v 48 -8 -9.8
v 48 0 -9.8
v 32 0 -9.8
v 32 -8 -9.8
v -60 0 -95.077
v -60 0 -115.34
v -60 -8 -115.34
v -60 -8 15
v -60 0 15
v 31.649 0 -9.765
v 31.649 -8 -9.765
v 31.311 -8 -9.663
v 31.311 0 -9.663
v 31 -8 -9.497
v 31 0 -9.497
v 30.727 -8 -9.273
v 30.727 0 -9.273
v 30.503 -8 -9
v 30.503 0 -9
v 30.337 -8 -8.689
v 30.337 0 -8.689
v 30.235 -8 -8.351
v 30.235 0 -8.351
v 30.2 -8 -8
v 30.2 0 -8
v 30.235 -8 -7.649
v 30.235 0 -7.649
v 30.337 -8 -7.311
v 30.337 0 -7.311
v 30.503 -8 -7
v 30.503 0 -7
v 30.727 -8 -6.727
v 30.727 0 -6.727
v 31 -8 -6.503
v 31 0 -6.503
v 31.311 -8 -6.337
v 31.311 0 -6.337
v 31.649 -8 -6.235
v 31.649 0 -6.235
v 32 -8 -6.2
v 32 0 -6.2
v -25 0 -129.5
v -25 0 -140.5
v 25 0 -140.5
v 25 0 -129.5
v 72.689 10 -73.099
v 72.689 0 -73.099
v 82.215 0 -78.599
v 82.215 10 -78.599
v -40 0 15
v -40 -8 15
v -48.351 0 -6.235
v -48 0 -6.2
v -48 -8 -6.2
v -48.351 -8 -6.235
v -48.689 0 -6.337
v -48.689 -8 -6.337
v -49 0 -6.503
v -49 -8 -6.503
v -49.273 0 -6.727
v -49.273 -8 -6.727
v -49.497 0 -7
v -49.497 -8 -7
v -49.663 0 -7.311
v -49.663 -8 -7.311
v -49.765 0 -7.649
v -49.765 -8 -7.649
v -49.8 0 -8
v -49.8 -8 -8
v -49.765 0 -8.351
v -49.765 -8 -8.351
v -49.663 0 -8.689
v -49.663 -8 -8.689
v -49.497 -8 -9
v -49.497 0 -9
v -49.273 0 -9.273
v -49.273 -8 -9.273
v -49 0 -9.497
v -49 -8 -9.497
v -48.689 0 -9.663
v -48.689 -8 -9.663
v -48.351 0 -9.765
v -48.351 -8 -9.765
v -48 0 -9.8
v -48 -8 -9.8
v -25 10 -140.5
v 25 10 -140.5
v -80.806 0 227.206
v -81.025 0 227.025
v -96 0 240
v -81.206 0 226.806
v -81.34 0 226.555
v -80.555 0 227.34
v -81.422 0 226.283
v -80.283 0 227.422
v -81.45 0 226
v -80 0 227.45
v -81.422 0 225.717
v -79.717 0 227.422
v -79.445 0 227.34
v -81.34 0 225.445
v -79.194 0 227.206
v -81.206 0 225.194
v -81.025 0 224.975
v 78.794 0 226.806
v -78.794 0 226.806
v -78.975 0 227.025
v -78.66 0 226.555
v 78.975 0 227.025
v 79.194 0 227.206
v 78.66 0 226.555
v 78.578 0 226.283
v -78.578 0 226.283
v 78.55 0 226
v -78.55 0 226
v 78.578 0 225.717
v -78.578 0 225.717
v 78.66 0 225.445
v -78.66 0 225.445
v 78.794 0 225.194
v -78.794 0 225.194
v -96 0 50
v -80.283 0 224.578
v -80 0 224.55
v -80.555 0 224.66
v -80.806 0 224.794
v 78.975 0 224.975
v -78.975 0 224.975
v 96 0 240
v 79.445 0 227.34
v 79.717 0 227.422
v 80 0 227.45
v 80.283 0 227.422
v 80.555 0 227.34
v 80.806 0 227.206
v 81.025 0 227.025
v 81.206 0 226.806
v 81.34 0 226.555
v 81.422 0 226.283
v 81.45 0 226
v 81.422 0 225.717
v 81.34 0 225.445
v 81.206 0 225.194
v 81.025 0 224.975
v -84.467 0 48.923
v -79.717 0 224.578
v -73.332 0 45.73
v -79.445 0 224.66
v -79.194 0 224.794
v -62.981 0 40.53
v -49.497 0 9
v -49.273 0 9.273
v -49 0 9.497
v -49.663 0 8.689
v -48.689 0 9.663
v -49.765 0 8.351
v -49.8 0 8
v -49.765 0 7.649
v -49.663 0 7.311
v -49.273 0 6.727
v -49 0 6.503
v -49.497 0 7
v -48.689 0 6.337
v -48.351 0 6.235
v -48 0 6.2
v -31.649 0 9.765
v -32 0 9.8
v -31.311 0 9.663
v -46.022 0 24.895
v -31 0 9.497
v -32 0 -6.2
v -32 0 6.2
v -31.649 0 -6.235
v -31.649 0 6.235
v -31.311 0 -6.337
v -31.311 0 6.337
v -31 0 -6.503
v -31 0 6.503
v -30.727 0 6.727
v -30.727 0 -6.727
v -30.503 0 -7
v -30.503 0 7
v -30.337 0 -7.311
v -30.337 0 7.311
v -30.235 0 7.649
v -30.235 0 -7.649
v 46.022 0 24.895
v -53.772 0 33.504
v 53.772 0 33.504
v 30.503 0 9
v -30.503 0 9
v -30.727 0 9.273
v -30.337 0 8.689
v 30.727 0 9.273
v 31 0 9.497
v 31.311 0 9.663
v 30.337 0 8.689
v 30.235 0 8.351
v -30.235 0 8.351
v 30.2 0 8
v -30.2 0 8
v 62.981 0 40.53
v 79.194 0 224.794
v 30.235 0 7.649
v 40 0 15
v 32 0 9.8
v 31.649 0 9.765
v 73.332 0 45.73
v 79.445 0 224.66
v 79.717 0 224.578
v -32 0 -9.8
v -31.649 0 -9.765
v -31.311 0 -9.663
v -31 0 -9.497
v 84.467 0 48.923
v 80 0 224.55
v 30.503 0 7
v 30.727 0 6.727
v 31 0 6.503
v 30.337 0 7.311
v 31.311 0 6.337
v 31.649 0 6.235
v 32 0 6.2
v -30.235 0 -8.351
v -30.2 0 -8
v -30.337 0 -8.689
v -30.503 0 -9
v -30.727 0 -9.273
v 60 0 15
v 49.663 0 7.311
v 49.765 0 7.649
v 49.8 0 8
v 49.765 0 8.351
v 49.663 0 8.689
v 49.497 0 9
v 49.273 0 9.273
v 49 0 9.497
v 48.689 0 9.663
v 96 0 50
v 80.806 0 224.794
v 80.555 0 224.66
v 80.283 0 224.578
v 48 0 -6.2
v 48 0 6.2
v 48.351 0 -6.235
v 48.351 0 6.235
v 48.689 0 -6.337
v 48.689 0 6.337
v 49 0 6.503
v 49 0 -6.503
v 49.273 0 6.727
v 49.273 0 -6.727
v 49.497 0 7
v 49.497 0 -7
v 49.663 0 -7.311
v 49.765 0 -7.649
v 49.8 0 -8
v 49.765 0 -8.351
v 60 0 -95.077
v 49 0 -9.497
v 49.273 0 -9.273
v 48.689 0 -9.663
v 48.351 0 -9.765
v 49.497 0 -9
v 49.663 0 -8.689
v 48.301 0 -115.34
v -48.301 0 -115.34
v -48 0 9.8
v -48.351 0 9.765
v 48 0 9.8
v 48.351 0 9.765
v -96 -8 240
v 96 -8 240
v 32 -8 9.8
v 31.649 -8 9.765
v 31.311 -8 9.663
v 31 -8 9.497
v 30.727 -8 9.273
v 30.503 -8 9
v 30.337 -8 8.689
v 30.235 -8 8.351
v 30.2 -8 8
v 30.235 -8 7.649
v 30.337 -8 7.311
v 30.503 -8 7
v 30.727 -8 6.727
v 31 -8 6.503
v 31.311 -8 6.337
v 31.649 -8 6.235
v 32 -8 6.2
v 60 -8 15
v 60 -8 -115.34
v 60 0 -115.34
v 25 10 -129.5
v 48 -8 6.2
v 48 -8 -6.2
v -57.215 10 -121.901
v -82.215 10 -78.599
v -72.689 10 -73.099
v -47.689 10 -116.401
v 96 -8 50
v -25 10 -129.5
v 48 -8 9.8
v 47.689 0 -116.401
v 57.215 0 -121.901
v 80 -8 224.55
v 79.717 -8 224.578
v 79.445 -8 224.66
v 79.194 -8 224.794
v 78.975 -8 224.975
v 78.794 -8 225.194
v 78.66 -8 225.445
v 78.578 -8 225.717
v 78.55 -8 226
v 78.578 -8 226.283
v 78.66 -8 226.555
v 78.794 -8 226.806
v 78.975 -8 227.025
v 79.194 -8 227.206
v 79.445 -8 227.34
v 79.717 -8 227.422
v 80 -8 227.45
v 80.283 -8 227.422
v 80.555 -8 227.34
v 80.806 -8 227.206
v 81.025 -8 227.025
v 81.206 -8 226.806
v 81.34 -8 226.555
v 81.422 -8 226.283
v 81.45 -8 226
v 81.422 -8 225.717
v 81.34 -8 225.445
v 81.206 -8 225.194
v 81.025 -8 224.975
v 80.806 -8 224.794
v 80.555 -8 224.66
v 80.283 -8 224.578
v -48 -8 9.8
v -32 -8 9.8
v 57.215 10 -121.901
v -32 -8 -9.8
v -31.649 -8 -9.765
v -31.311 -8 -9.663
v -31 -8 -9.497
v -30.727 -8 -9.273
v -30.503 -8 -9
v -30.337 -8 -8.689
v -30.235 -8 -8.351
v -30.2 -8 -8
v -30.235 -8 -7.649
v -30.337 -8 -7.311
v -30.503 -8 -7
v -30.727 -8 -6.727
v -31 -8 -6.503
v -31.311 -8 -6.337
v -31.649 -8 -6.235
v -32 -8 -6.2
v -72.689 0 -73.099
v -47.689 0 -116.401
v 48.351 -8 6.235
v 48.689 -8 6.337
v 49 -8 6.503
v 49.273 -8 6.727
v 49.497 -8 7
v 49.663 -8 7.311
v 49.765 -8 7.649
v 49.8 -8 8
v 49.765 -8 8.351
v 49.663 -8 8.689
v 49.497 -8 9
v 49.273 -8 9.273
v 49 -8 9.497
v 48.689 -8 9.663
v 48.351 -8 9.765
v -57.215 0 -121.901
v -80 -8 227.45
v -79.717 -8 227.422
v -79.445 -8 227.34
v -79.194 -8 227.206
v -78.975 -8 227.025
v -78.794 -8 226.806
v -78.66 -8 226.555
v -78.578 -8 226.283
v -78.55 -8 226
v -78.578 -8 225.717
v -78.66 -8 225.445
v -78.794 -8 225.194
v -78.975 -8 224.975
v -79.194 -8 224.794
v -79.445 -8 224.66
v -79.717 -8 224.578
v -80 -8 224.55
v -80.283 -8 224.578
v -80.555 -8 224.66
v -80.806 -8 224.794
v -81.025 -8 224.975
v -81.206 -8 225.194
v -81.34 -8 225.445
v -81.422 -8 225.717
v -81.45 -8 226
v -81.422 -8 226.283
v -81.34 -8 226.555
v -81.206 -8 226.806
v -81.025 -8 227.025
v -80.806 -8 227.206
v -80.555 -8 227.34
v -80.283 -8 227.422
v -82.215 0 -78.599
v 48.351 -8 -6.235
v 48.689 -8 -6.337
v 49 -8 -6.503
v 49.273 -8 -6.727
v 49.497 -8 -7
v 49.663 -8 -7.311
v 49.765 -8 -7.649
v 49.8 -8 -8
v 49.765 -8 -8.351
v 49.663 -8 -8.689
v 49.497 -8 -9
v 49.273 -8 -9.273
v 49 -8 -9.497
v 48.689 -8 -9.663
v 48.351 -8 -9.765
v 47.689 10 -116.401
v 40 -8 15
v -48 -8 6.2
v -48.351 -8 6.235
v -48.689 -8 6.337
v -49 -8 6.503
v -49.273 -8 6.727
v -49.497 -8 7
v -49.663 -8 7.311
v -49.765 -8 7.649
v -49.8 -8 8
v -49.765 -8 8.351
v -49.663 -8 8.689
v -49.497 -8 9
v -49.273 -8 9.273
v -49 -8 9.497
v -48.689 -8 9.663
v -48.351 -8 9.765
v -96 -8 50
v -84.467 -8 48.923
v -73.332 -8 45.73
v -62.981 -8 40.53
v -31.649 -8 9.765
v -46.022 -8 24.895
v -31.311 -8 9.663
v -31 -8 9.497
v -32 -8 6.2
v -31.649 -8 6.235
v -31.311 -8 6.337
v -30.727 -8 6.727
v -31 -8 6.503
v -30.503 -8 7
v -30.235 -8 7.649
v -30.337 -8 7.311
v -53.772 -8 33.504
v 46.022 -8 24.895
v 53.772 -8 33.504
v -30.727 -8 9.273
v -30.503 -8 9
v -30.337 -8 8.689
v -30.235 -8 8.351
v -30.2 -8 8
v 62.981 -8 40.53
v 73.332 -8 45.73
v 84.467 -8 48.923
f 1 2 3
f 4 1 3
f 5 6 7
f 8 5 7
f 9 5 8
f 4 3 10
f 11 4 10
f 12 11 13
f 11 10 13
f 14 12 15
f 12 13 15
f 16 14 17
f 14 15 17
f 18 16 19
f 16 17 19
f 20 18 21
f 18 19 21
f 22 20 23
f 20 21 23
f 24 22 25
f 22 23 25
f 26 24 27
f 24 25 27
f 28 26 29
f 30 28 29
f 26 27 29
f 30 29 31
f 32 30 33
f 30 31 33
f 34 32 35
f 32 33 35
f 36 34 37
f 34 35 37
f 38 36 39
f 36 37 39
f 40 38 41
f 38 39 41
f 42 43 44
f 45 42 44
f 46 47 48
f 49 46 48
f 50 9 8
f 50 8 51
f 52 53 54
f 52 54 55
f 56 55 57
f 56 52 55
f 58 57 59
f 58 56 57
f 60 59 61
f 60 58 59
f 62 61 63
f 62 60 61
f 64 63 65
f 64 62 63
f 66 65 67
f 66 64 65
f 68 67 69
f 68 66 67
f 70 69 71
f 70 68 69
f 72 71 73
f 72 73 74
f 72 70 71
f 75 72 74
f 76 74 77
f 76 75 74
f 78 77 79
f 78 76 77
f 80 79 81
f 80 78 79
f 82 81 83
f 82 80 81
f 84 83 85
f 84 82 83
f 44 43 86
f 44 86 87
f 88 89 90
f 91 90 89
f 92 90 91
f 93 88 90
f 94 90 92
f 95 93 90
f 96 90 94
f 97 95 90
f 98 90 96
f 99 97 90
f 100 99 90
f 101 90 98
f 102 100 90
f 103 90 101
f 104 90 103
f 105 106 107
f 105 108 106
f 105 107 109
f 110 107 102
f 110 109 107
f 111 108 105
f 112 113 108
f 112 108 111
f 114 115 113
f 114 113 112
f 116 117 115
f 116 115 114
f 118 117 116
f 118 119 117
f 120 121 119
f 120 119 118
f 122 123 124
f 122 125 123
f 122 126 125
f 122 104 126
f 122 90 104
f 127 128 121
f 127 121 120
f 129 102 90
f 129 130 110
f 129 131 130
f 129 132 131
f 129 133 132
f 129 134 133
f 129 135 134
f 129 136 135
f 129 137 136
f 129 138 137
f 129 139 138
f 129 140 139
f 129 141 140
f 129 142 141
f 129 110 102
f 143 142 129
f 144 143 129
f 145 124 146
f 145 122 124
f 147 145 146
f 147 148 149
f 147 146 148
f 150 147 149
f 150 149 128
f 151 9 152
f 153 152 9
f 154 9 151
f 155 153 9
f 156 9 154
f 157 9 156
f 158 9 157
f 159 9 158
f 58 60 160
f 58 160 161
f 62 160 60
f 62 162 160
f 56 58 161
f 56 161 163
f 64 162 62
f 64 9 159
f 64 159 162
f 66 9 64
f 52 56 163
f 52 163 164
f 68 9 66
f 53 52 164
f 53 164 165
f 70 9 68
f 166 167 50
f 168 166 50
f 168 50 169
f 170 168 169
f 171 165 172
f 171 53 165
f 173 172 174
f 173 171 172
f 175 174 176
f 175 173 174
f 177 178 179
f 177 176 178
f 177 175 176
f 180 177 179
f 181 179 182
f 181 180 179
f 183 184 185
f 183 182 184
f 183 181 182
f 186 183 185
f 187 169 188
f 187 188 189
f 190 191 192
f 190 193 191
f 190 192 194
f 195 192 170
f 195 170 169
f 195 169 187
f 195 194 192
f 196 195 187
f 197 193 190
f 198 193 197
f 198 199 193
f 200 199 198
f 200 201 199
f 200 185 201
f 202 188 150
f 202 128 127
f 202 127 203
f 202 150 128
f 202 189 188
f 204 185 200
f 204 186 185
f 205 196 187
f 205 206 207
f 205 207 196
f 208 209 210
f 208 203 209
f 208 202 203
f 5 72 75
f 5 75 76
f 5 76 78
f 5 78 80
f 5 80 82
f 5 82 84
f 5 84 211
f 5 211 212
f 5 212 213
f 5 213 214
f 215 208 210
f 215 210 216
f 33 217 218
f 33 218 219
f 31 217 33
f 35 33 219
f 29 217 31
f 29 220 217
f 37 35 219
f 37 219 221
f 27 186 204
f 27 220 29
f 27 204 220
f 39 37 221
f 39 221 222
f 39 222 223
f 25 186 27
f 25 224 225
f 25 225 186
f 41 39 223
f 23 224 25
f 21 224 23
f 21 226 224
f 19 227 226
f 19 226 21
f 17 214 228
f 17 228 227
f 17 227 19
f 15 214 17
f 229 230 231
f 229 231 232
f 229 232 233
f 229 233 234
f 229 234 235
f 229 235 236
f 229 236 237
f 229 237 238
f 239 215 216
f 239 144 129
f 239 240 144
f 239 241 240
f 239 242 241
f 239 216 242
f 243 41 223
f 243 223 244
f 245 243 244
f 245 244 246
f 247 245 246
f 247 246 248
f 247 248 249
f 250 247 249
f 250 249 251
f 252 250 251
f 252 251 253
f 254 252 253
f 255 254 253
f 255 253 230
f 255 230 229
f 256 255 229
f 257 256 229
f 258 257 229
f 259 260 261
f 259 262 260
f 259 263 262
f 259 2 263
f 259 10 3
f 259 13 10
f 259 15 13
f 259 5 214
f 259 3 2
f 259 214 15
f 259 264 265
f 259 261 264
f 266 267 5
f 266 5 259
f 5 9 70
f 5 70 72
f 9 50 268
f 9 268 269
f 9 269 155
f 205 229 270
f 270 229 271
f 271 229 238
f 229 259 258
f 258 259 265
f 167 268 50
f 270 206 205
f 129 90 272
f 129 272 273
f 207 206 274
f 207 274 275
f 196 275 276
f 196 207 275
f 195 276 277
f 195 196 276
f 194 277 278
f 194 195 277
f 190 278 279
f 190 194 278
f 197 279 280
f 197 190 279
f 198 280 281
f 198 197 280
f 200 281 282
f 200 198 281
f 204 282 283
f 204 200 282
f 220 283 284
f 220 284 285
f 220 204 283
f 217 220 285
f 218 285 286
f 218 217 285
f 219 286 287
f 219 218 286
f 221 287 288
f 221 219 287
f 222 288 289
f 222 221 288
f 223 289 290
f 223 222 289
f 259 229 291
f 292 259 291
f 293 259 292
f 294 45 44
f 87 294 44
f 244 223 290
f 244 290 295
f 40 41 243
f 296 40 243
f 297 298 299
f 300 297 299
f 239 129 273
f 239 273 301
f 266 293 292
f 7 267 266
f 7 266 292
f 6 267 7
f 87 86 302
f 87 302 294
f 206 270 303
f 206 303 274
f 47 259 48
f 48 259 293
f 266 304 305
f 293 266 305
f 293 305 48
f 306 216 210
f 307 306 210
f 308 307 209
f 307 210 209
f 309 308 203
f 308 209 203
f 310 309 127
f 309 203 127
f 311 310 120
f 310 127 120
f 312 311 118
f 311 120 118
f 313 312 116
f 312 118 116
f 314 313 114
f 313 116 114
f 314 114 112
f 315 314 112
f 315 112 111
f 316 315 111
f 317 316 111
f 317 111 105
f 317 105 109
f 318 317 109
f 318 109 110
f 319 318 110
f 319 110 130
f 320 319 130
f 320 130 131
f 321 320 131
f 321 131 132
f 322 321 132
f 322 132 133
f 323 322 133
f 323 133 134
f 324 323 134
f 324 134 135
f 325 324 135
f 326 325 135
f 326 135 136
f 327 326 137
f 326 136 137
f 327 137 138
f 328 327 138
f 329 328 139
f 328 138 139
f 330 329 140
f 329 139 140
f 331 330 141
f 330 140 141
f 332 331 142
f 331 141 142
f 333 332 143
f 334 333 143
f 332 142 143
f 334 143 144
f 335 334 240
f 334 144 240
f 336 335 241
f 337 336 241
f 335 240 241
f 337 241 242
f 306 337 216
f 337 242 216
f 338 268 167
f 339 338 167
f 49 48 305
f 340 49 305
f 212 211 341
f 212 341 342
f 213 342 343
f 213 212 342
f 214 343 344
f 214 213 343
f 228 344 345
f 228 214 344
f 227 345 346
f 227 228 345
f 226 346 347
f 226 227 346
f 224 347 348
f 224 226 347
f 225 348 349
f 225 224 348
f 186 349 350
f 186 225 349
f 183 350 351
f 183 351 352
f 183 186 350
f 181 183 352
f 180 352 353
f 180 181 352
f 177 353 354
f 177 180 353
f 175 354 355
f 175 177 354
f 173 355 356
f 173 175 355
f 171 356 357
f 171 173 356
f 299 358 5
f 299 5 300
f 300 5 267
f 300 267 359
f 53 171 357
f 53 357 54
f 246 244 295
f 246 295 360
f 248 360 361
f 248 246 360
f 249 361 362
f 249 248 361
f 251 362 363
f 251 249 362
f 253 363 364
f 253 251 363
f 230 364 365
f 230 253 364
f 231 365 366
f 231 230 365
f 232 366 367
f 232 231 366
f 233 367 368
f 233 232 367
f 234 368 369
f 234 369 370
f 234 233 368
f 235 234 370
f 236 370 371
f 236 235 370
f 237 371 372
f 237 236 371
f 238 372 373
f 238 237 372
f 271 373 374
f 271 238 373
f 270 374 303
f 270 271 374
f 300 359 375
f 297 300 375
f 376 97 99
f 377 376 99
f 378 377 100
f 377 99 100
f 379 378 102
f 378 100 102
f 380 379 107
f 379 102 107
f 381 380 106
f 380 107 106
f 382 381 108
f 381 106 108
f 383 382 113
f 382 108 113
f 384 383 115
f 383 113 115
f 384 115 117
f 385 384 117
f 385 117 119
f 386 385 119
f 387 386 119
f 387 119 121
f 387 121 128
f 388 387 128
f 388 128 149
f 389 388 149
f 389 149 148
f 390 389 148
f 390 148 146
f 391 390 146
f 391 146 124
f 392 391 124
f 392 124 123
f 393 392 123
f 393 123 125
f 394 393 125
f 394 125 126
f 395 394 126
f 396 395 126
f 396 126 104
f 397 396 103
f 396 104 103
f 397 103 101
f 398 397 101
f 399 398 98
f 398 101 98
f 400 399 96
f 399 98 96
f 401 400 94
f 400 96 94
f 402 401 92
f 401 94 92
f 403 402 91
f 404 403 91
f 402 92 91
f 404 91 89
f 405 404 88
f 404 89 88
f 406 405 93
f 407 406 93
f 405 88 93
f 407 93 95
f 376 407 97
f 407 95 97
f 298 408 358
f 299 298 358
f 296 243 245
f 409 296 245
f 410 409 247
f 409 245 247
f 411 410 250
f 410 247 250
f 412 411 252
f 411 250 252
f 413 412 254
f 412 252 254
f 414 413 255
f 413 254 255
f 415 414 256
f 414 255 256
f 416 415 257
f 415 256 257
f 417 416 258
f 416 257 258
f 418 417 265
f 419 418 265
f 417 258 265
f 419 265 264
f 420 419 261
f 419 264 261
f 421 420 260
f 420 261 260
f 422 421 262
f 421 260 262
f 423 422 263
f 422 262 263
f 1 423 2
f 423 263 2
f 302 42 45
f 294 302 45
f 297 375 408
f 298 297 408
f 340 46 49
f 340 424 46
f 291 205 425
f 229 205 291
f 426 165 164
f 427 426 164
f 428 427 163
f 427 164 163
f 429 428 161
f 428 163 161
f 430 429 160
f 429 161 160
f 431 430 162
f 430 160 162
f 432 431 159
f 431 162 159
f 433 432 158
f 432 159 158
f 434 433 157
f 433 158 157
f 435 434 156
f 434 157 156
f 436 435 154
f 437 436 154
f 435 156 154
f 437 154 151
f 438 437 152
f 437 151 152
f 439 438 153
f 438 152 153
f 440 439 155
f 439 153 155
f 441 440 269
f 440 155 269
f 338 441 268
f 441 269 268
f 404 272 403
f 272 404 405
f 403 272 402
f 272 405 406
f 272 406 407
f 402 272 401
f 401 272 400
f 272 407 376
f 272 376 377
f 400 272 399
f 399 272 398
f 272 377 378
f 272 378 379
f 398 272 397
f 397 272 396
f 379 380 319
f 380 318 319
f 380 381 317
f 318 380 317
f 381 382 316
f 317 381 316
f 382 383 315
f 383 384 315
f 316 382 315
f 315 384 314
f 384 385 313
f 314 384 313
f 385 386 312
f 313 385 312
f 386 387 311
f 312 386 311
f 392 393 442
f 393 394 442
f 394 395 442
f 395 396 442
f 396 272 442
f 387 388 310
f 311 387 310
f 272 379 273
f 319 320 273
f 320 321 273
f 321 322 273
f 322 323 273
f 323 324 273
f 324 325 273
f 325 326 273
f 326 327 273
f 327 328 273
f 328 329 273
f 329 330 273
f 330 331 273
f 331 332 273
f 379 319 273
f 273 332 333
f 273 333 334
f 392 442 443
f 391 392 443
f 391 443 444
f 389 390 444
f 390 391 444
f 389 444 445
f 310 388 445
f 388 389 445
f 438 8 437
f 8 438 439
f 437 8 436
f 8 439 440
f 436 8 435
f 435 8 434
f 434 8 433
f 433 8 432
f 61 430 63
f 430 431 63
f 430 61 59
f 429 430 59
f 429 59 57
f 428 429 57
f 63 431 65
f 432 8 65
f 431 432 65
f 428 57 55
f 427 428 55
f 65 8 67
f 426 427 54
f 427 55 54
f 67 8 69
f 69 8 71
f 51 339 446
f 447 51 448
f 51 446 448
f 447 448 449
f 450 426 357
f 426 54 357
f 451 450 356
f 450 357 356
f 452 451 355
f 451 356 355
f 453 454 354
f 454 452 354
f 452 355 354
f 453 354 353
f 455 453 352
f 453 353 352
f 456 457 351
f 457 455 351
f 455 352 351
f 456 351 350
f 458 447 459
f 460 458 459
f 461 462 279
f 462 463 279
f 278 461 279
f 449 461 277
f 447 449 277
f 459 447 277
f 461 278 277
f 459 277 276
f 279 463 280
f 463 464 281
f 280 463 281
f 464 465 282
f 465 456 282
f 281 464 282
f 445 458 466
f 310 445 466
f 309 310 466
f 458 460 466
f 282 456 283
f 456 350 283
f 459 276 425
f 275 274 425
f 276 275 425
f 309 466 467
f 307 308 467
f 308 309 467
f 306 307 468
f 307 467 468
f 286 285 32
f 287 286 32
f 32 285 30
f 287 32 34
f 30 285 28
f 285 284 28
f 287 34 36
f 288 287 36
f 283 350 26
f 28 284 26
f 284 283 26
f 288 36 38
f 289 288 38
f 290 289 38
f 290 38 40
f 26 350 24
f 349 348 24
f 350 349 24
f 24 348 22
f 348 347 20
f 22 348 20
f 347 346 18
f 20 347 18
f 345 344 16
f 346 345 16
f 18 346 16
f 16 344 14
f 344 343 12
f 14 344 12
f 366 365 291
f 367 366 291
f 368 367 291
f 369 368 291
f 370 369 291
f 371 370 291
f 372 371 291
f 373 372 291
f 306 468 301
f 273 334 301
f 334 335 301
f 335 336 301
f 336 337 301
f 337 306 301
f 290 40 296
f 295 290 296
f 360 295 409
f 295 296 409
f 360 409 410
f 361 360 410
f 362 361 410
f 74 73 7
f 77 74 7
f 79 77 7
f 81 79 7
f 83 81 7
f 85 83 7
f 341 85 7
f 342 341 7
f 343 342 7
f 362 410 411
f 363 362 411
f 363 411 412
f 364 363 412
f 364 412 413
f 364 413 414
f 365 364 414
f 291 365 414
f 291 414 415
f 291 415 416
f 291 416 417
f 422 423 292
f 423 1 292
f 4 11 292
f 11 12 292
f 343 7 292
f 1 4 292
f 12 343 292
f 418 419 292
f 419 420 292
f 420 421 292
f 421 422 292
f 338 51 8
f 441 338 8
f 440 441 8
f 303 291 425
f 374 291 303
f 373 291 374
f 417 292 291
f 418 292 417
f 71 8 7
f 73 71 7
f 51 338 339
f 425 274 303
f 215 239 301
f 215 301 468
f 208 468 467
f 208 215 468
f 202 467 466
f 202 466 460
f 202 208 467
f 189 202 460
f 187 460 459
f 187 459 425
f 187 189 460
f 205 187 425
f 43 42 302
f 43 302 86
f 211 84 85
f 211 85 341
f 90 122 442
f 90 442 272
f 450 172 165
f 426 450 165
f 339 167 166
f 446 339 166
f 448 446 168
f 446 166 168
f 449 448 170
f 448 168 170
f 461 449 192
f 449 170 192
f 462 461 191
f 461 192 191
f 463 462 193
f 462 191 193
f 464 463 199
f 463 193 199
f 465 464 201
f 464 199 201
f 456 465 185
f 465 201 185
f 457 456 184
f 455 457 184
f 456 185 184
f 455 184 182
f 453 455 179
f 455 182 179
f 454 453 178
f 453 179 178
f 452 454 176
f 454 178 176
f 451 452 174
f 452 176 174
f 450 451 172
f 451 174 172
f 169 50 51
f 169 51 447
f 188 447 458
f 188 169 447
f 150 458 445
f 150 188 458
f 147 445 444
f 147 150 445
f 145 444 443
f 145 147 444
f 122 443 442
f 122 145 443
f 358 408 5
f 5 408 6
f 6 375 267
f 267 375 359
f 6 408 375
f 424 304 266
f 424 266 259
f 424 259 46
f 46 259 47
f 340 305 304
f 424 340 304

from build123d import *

# Parameters (mm, degrees)
EXTRUDE_1_DEPTH     = 8
SKETCH_2_W          = 50
SKETCH_2_H          = 11
EXTRUDE_2_DEPTH     = 10
SKETCH_4_R          = 1.45
CUT_EXTRUDE_1_DEPTH = 259.681271065


with BuildPart() as part:
    # 草图1 → 凸台-拉伸1 (new body)
    with BuildSketch(Plane(origin=(0, 0, 0), x_dir=(1, 0, 0), z_dir=(0, 1, 0))):
        with BuildLine():
            Line((-60, 15), (-60, -15))
            Line((-60, -15), (-40, -15))
            ThreePointArc((-40, -15), (-62.981066038, -40.53029434), (-96, -50))
            Line((-96, -50), (-96, -240))
            Line((-96, -240), (-40, -240))
            Line((-40, -240), (40, -240))
            Line((40, -240), (96, -240))
            Line((96, -240), (96, -50))
            ThreePointArc((96, -50), (62.981066038, -40.53029434), (40, -15))
            Line((40, -15), (60, -15))
            Line((60, -15), (60, 15))
            Line((60, 15), (60, 115.340483965))
            Line((60, 115.340483965), (-60, 115.340483965))
            Line((-60, 115.340483965), (-60, 15))
        make_face()
        with BuildLine():
            Line((-48, 9.8), (-32, 9.8))
            ThreePointArc((-32, 9.8), (-30.2, 8), (-32, 6.2))
            Line((-32, 6.2), (-48, 6.2))
            ThreePointArc((-48, 6.2), (-49.8, 8), (-48, 9.8))
        make_face(mode=Mode.SUBTRACT)
        with BuildLine():
            Line((-48, -9.8), (-32, -9.8))
            ThreePointArc((-32, -9.8), (-30.2, -8), (-32, -6.2))
            Line((-32, -6.2), (-48, -6.2))
            ThreePointArc((-48, -6.2), (-49.8, -8), (-48, -9.8))
        make_face(mode=Mode.SUBTRACT)
        with BuildLine():
            Line((48, 9.8), (32, 9.8))
            ThreePointArc((32, 9.8), (30.2, 8), (32, 6.2))
            Line((32, 6.2), (48, 6.2))
            ThreePointArc((48, 6.2), (49.8, 8), (48, 9.8))
        make_face(mode=Mode.SUBTRACT)
        with BuildLine():
            Line((48, -9.8), (32, -9.8))
            ThreePointArc((32, -9.8), (30.2, -8), (32, -6.2))
            Line((32, -6.2), (48, -6.2))
            ThreePointArc((48, -6.2), (49.8, -8), (48, -9.8))
        make_face(mode=Mode.SUBTRACT)
    extrude(amount=-EXTRUDE_1_DEPTH)

    # 草图2 → 凸台-拉伸2 (add)
    with BuildSketch(Plane(origin=(0, 0, 0), x_dir=(1, 0, 0), z_dir=(0, 1, 0))):
        Polygon((72.688765563, 73.099364905), (82.215045005, 78.599364905), (57.215045005, 121.900635095), (47.688765563, 116.400635095), align=None)
        Polygon((-47.688765563, 116.400635095), (-57.215045005, 121.900635095), (-82.215045005, 78.599364905), (-72.688765563, 73.099364905), align=None)
        with Locations((0, 135)):
            Rectangle(SKETCH_2_W, SKETCH_2_H)
    extrude(amount=EXTRUDE_2_DEPTH)


with BuildPart() as extrude_2_piece_1:
    # of the separate pieces the step leaves, piece 1, a body of its own (extrude_2_pieces)
    add(part.part.solids().sort_by_distance((40, 0, 15))[0])

    # 草图4 → 切除-拉伸1 (cut, through all)
    with BuildSketch(Plane(origin=(0, 0, 0), x_dir=(1, 0, 0), z_dir=(0, 1, 0))):
        with Locations(Location((-80, -226, 0), (0, 0, 270))):
            Circle(SKETCH_4_R)
        with Locations(Location((80, -226, 0), (0, 0, 90))):
            Circle(SKETCH_4_R)
    extrude(amount=-CUT_EXTRUDE_1_DEPTH, mode=Mode.SUBTRACT)


with BuildPart() as extrude_2_piece_2:
    # of the separate pieces the step leaves, piece 2, a body of its own (extrude_2_pieces)
    add(part.part.solids().sort_by_distance((25, 0, -129.5))[0])


solid = Compound([extrude_2_piece_1.part, extrude_2_piece_2.part])
